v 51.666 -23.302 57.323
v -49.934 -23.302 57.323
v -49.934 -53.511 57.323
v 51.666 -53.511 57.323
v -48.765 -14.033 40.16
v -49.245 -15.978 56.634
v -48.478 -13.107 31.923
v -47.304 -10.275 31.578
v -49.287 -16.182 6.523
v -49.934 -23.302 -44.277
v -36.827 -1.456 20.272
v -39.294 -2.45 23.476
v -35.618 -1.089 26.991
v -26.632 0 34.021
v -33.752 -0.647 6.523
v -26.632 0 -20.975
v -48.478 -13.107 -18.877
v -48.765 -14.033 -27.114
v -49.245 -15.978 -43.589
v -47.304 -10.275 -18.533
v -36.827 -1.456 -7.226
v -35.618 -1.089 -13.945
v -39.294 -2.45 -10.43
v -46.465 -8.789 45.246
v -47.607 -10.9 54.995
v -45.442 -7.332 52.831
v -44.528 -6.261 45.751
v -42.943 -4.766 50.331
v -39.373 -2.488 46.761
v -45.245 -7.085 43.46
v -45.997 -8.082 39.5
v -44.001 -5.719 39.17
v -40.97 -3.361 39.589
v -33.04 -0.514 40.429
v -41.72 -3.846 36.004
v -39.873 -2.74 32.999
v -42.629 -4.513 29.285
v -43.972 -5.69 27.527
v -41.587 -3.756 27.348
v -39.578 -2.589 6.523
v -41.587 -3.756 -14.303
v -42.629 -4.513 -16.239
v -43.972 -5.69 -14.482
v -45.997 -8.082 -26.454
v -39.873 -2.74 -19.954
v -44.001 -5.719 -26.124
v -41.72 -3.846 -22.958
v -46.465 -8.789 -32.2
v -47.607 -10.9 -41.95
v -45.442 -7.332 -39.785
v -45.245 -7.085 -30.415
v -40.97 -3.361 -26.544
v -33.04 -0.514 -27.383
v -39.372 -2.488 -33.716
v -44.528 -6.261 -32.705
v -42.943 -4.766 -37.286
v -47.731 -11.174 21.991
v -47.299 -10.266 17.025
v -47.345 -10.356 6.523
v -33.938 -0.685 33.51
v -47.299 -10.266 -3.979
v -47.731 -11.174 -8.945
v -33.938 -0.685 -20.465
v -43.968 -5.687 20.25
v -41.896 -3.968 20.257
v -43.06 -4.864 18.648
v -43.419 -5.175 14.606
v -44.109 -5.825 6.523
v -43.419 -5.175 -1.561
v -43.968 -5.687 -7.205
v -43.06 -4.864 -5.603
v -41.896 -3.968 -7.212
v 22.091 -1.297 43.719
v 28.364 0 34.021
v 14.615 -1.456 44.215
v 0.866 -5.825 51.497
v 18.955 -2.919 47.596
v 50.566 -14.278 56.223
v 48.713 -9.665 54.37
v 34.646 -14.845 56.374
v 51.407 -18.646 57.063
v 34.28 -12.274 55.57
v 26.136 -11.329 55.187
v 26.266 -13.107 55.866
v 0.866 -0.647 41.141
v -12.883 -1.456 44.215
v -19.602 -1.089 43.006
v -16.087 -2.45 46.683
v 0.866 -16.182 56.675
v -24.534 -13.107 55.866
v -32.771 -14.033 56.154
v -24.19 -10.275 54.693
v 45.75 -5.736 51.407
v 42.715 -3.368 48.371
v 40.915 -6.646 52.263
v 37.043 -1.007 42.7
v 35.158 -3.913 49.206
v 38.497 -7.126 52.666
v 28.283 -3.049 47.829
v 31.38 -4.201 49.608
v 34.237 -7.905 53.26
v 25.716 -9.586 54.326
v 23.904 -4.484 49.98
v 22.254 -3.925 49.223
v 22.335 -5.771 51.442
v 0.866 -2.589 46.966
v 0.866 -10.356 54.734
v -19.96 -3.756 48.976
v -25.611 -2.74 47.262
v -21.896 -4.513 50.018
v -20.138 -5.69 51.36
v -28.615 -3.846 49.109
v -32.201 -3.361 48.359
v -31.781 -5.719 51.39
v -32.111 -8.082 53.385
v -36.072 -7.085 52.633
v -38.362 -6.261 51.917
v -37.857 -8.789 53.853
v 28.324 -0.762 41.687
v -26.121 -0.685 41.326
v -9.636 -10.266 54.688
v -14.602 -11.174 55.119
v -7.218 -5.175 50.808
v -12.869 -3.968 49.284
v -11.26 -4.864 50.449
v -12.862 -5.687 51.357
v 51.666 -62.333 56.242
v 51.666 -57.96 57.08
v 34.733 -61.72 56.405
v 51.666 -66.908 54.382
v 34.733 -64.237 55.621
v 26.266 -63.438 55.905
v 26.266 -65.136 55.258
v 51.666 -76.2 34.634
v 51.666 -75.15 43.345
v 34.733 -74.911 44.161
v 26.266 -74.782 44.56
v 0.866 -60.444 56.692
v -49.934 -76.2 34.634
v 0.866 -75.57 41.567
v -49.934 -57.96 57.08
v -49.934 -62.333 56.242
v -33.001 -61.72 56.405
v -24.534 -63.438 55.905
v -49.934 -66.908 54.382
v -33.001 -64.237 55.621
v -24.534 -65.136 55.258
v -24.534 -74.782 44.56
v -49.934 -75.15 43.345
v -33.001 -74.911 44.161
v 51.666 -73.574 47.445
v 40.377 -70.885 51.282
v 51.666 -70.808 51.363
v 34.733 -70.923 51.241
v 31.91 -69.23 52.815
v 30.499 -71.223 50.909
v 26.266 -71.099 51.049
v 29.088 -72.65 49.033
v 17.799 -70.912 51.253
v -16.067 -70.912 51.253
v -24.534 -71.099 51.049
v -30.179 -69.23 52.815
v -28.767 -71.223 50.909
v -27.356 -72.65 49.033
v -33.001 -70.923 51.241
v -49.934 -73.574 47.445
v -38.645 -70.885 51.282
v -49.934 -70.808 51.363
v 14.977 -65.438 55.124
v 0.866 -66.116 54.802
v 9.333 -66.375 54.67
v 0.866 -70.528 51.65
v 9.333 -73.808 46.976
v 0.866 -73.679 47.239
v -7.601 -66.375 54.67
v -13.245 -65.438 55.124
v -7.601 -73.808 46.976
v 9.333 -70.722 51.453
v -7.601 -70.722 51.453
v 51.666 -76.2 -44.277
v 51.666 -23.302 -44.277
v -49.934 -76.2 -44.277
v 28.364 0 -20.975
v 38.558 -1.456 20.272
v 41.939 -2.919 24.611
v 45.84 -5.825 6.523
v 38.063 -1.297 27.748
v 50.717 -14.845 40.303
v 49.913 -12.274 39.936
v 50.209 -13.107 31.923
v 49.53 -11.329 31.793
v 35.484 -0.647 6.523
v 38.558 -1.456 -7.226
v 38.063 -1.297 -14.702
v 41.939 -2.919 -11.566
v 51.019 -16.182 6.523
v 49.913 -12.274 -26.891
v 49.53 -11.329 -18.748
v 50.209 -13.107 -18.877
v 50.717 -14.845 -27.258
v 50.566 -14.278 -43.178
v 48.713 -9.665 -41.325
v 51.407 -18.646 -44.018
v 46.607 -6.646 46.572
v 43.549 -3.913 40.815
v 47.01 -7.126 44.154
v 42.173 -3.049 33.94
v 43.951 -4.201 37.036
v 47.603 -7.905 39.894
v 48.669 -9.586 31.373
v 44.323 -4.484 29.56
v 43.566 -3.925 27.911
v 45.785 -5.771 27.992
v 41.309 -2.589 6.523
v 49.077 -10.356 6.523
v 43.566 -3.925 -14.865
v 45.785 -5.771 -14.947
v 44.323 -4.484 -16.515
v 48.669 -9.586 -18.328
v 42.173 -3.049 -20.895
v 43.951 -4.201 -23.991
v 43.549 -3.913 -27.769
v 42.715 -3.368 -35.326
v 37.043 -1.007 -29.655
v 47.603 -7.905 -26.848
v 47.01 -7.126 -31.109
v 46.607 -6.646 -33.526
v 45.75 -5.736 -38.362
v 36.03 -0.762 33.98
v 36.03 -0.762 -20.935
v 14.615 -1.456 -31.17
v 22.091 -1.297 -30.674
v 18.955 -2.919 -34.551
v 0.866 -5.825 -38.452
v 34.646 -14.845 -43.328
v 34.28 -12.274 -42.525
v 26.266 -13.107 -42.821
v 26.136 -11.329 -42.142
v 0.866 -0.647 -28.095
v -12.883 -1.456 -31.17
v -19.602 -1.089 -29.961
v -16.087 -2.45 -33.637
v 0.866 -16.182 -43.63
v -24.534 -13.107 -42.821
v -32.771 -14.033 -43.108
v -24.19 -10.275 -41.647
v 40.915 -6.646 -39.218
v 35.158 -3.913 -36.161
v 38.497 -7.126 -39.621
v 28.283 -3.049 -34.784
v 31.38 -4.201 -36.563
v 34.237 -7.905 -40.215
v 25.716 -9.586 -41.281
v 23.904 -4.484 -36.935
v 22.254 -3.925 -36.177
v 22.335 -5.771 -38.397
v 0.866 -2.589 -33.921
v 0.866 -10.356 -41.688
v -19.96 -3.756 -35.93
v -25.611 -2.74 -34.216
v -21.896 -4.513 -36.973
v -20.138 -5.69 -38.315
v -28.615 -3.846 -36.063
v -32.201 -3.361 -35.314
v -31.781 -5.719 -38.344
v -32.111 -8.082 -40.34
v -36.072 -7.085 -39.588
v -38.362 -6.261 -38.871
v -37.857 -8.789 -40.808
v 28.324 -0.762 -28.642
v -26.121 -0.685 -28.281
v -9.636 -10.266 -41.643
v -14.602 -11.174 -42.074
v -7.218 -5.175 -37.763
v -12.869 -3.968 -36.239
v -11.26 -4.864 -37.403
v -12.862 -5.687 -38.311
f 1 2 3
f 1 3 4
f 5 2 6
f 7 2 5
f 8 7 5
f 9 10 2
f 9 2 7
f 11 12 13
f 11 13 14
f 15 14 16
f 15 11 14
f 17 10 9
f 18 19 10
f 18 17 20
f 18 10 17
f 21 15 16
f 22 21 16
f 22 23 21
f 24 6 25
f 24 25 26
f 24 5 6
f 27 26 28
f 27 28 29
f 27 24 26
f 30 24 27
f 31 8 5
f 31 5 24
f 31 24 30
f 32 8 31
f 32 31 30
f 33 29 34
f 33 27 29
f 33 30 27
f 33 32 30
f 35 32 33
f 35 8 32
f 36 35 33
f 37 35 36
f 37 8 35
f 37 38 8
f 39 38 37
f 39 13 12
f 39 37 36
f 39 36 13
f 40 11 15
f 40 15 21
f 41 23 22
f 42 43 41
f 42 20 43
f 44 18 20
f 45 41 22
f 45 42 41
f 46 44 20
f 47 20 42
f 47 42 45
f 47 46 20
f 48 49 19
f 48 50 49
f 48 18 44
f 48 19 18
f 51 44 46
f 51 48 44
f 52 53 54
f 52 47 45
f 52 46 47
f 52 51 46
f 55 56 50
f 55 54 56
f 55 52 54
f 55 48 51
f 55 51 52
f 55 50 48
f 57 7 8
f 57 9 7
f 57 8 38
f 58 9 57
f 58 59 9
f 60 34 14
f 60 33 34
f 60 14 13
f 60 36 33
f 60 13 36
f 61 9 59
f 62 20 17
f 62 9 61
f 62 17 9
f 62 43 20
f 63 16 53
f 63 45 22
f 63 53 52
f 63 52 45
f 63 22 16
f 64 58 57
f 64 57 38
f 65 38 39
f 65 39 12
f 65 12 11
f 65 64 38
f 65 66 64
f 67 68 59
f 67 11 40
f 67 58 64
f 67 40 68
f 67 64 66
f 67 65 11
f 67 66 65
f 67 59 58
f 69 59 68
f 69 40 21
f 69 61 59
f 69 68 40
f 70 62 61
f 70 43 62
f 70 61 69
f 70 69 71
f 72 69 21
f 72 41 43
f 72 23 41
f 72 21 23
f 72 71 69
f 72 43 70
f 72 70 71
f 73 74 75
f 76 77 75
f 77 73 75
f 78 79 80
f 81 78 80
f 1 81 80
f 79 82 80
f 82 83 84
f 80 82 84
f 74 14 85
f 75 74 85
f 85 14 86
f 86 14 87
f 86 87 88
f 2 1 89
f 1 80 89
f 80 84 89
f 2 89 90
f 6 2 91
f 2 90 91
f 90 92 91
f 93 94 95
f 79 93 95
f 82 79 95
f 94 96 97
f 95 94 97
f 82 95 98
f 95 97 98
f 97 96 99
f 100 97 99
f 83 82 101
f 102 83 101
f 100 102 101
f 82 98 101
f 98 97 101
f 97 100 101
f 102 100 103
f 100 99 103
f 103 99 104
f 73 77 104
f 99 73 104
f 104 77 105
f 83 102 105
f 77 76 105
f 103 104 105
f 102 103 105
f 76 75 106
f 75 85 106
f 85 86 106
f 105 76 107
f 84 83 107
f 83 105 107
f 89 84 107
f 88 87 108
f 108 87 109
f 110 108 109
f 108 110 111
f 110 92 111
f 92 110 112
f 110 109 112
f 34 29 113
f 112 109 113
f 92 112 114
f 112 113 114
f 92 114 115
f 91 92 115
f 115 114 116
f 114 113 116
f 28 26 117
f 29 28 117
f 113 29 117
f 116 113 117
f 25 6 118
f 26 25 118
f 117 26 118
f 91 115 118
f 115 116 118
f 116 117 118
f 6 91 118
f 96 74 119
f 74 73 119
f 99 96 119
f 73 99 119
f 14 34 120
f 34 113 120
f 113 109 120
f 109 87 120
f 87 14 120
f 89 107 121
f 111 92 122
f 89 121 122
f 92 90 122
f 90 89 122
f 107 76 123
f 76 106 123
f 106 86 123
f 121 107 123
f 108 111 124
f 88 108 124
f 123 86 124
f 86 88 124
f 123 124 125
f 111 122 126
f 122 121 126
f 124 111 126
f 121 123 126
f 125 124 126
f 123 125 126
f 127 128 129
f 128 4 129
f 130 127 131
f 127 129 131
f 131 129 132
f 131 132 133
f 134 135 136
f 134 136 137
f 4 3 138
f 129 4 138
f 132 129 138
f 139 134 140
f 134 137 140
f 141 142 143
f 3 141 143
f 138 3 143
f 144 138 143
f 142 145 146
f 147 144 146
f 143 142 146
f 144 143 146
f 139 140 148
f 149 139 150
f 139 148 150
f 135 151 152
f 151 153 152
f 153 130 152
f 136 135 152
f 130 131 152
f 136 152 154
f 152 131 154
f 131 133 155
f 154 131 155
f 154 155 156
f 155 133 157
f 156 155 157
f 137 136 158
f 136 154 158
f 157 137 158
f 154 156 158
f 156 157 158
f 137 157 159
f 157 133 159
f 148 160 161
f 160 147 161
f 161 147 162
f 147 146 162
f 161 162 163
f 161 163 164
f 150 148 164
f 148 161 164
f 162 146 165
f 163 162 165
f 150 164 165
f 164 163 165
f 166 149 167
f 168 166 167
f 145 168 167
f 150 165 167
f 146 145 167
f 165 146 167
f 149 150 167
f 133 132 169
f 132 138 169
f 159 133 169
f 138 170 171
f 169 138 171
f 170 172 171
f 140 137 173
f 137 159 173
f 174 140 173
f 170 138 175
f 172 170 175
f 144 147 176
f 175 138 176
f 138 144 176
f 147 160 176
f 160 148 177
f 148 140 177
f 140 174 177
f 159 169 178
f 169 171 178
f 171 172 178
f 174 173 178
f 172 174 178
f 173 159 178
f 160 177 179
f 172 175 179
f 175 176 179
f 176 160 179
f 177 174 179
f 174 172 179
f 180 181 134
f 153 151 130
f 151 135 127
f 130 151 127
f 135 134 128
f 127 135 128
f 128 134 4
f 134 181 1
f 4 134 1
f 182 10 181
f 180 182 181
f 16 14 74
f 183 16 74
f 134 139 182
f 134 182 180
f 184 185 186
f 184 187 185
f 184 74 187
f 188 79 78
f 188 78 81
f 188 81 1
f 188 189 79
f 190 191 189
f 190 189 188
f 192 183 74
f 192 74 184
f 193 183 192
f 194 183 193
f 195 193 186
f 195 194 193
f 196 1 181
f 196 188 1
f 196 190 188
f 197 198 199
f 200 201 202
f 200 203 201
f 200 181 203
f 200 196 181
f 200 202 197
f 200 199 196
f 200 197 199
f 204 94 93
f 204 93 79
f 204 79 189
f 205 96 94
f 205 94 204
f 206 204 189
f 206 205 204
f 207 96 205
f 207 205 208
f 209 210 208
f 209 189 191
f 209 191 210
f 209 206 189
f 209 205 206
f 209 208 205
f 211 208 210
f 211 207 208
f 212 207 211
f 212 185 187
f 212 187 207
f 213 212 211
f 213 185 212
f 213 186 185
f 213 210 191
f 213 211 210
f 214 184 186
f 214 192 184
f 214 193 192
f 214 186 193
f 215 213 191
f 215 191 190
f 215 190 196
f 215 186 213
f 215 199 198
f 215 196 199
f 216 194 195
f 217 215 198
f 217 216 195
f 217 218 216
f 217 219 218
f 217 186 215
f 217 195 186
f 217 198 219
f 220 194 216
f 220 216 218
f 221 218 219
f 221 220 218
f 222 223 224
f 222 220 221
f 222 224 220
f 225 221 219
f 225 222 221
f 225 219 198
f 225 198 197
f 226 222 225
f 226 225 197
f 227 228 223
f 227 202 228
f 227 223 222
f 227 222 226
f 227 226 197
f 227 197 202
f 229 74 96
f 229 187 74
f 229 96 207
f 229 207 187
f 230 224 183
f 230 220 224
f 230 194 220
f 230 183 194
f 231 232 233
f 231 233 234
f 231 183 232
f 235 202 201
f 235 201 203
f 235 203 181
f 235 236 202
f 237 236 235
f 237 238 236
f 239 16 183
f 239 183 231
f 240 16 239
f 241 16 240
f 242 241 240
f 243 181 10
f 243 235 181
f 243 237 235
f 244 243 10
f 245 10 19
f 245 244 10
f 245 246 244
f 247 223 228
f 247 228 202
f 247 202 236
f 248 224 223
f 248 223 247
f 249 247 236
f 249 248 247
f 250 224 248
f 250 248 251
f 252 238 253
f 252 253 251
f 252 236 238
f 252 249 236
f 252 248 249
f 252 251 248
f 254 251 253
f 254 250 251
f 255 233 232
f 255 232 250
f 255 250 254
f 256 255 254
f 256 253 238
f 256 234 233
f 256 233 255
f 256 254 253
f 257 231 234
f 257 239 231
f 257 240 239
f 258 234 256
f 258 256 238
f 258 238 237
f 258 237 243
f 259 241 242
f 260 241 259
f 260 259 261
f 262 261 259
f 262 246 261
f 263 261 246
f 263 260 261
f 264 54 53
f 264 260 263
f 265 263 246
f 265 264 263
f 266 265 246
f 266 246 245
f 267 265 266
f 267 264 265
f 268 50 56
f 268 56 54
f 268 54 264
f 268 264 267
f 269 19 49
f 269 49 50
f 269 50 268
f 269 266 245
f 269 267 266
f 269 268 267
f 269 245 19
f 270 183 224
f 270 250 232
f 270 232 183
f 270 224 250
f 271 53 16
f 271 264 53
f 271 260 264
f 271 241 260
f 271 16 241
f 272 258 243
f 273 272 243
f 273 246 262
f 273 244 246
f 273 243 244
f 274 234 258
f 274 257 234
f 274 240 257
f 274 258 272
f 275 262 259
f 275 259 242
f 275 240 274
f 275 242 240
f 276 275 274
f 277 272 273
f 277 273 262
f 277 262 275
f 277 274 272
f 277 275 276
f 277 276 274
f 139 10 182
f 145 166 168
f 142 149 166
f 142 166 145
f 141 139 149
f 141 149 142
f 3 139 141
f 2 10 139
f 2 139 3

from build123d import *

# Parameters (mm, degrees)
F0_W        = 101.6
F0_H        = 101.6
F1_DEPTH    = 76.2
F2_T1_DEPTH = 215.0438952959
F3_T1_DEPTH = 218.1099465201
F3_T3_DEPTH = 218.1099465201


# Not quite as in the source:
# - a fillet or chamfer that OpenCascade refuses, or shapes differently, is made with other operations: its cross-section is extruded or revolved along the edge and cut away or added


with BuildPart() as f1:
    # F0 (on Front) → F1 (new body)
    with BuildSketch(Plane.XZ):
        with Locations((0.8658623874, 6.5226784527)):
            Rectangle(F0_W, F0_H)
    extrude(amount=F1_DEPTH)

    # F2: fillet of radius 22.6887790592 on 1 edges, made by hand

    # F2_s2 → F2_t1 (cut)
    with BuildSketch(Plane.YZ.offset(-106.6560852605)):
        with BuildLine():
            add(Edge.make_bspline(
                [(-53.5112209408, 57.3226784527), (-76.2, 57.3226784527), (-76.2, 34.6338993935)],
                knots=[0, 0, 0, 1, 1, 1], degree=2, weights=[1, 1, 1]))
            Line((-76.2, 34.6338993935), (-76.2, 57.3226784527))
            Line((-76.2, 57.3226784527), (-53.5112209408, 57.3226784527))
        make_face()
    extrude(amount=F2_T1_DEPTH, mode=Mode.SUBTRACT)

    # F3: fillet of radius 23.301989304 on 4 edges, made by hand

    # F3_s2 → F3_t1 (cut)
    with BuildSketch(Plane.XY.offset(-102.5322948073)):
        with BuildLine():
            add(Edge.make_bspline(
                [(-49.9341376126, -23.301989304), (-49.9341376126, 0), (-26.6321483086, 0)],
                knots=[0, 0, 0, 1, 1, 1], degree=2, weights=[1, 1, 1]))
            Line((-26.6321483086, 0), (-49.9341376126, 0))
            Line((-49.9341376126, 0), (-49.9341376126, -23.301989304))
        make_face()
        with BuildLine():
            add(Edge.make_bspline(
                [(28.3638730834, 0), (51.6658623874, 0), (51.6658623874, -23.301989304)],
                knots=[0, 0, 0, 1, 1, 1], degree=2, weights=[1, 1, 1]))
            Line((51.6658623874, -23.301989304), (51.6658623874, 0))
            Line((51.6658623874, 0), (28.3638730834, 0))
        make_face()
    extrude(amount=F3_T1_DEPTH, mode=Mode.SUBTRACT)

    # F3_s4 → F3_t3 (cut)
    with BuildSketch(Plane.YZ.offset(-108.1891108726)):
        with BuildLine():
            add(Edge.make_bspline(
                [(0, -20.9753322432), (0, -44.2773215473), (-23.301989304, -44.2773215473)],
                knots=[0, 0, 0, 1, 1, 1], degree=2, weights=[1, 1, 1]))
            Line((-23.301989304, -44.2773215473), (0, -44.2773215473))
            Line((0, -44.2773215473), (0, -20.9753322432))
        make_face()
        with BuildLine():
            add(Edge.make_bspline(
                [(0, 34.0206891487), (0, 57.3226784527), (-23.301989304, 57.3226784527)],
                knots=[0, 0, 0, 1, 1, 1], degree=2, weights=[1, 1, 1]))
            Line((-23.301989304, 57.3226784527), (0, 57.3226784527))
            Line((0, 57.3226784527), (0, 34.0206891487))
        make_face()
    extrude(amount=F3_T3_DEPTH, mode=Mode.SUBTRACT)


solid = f1.part
